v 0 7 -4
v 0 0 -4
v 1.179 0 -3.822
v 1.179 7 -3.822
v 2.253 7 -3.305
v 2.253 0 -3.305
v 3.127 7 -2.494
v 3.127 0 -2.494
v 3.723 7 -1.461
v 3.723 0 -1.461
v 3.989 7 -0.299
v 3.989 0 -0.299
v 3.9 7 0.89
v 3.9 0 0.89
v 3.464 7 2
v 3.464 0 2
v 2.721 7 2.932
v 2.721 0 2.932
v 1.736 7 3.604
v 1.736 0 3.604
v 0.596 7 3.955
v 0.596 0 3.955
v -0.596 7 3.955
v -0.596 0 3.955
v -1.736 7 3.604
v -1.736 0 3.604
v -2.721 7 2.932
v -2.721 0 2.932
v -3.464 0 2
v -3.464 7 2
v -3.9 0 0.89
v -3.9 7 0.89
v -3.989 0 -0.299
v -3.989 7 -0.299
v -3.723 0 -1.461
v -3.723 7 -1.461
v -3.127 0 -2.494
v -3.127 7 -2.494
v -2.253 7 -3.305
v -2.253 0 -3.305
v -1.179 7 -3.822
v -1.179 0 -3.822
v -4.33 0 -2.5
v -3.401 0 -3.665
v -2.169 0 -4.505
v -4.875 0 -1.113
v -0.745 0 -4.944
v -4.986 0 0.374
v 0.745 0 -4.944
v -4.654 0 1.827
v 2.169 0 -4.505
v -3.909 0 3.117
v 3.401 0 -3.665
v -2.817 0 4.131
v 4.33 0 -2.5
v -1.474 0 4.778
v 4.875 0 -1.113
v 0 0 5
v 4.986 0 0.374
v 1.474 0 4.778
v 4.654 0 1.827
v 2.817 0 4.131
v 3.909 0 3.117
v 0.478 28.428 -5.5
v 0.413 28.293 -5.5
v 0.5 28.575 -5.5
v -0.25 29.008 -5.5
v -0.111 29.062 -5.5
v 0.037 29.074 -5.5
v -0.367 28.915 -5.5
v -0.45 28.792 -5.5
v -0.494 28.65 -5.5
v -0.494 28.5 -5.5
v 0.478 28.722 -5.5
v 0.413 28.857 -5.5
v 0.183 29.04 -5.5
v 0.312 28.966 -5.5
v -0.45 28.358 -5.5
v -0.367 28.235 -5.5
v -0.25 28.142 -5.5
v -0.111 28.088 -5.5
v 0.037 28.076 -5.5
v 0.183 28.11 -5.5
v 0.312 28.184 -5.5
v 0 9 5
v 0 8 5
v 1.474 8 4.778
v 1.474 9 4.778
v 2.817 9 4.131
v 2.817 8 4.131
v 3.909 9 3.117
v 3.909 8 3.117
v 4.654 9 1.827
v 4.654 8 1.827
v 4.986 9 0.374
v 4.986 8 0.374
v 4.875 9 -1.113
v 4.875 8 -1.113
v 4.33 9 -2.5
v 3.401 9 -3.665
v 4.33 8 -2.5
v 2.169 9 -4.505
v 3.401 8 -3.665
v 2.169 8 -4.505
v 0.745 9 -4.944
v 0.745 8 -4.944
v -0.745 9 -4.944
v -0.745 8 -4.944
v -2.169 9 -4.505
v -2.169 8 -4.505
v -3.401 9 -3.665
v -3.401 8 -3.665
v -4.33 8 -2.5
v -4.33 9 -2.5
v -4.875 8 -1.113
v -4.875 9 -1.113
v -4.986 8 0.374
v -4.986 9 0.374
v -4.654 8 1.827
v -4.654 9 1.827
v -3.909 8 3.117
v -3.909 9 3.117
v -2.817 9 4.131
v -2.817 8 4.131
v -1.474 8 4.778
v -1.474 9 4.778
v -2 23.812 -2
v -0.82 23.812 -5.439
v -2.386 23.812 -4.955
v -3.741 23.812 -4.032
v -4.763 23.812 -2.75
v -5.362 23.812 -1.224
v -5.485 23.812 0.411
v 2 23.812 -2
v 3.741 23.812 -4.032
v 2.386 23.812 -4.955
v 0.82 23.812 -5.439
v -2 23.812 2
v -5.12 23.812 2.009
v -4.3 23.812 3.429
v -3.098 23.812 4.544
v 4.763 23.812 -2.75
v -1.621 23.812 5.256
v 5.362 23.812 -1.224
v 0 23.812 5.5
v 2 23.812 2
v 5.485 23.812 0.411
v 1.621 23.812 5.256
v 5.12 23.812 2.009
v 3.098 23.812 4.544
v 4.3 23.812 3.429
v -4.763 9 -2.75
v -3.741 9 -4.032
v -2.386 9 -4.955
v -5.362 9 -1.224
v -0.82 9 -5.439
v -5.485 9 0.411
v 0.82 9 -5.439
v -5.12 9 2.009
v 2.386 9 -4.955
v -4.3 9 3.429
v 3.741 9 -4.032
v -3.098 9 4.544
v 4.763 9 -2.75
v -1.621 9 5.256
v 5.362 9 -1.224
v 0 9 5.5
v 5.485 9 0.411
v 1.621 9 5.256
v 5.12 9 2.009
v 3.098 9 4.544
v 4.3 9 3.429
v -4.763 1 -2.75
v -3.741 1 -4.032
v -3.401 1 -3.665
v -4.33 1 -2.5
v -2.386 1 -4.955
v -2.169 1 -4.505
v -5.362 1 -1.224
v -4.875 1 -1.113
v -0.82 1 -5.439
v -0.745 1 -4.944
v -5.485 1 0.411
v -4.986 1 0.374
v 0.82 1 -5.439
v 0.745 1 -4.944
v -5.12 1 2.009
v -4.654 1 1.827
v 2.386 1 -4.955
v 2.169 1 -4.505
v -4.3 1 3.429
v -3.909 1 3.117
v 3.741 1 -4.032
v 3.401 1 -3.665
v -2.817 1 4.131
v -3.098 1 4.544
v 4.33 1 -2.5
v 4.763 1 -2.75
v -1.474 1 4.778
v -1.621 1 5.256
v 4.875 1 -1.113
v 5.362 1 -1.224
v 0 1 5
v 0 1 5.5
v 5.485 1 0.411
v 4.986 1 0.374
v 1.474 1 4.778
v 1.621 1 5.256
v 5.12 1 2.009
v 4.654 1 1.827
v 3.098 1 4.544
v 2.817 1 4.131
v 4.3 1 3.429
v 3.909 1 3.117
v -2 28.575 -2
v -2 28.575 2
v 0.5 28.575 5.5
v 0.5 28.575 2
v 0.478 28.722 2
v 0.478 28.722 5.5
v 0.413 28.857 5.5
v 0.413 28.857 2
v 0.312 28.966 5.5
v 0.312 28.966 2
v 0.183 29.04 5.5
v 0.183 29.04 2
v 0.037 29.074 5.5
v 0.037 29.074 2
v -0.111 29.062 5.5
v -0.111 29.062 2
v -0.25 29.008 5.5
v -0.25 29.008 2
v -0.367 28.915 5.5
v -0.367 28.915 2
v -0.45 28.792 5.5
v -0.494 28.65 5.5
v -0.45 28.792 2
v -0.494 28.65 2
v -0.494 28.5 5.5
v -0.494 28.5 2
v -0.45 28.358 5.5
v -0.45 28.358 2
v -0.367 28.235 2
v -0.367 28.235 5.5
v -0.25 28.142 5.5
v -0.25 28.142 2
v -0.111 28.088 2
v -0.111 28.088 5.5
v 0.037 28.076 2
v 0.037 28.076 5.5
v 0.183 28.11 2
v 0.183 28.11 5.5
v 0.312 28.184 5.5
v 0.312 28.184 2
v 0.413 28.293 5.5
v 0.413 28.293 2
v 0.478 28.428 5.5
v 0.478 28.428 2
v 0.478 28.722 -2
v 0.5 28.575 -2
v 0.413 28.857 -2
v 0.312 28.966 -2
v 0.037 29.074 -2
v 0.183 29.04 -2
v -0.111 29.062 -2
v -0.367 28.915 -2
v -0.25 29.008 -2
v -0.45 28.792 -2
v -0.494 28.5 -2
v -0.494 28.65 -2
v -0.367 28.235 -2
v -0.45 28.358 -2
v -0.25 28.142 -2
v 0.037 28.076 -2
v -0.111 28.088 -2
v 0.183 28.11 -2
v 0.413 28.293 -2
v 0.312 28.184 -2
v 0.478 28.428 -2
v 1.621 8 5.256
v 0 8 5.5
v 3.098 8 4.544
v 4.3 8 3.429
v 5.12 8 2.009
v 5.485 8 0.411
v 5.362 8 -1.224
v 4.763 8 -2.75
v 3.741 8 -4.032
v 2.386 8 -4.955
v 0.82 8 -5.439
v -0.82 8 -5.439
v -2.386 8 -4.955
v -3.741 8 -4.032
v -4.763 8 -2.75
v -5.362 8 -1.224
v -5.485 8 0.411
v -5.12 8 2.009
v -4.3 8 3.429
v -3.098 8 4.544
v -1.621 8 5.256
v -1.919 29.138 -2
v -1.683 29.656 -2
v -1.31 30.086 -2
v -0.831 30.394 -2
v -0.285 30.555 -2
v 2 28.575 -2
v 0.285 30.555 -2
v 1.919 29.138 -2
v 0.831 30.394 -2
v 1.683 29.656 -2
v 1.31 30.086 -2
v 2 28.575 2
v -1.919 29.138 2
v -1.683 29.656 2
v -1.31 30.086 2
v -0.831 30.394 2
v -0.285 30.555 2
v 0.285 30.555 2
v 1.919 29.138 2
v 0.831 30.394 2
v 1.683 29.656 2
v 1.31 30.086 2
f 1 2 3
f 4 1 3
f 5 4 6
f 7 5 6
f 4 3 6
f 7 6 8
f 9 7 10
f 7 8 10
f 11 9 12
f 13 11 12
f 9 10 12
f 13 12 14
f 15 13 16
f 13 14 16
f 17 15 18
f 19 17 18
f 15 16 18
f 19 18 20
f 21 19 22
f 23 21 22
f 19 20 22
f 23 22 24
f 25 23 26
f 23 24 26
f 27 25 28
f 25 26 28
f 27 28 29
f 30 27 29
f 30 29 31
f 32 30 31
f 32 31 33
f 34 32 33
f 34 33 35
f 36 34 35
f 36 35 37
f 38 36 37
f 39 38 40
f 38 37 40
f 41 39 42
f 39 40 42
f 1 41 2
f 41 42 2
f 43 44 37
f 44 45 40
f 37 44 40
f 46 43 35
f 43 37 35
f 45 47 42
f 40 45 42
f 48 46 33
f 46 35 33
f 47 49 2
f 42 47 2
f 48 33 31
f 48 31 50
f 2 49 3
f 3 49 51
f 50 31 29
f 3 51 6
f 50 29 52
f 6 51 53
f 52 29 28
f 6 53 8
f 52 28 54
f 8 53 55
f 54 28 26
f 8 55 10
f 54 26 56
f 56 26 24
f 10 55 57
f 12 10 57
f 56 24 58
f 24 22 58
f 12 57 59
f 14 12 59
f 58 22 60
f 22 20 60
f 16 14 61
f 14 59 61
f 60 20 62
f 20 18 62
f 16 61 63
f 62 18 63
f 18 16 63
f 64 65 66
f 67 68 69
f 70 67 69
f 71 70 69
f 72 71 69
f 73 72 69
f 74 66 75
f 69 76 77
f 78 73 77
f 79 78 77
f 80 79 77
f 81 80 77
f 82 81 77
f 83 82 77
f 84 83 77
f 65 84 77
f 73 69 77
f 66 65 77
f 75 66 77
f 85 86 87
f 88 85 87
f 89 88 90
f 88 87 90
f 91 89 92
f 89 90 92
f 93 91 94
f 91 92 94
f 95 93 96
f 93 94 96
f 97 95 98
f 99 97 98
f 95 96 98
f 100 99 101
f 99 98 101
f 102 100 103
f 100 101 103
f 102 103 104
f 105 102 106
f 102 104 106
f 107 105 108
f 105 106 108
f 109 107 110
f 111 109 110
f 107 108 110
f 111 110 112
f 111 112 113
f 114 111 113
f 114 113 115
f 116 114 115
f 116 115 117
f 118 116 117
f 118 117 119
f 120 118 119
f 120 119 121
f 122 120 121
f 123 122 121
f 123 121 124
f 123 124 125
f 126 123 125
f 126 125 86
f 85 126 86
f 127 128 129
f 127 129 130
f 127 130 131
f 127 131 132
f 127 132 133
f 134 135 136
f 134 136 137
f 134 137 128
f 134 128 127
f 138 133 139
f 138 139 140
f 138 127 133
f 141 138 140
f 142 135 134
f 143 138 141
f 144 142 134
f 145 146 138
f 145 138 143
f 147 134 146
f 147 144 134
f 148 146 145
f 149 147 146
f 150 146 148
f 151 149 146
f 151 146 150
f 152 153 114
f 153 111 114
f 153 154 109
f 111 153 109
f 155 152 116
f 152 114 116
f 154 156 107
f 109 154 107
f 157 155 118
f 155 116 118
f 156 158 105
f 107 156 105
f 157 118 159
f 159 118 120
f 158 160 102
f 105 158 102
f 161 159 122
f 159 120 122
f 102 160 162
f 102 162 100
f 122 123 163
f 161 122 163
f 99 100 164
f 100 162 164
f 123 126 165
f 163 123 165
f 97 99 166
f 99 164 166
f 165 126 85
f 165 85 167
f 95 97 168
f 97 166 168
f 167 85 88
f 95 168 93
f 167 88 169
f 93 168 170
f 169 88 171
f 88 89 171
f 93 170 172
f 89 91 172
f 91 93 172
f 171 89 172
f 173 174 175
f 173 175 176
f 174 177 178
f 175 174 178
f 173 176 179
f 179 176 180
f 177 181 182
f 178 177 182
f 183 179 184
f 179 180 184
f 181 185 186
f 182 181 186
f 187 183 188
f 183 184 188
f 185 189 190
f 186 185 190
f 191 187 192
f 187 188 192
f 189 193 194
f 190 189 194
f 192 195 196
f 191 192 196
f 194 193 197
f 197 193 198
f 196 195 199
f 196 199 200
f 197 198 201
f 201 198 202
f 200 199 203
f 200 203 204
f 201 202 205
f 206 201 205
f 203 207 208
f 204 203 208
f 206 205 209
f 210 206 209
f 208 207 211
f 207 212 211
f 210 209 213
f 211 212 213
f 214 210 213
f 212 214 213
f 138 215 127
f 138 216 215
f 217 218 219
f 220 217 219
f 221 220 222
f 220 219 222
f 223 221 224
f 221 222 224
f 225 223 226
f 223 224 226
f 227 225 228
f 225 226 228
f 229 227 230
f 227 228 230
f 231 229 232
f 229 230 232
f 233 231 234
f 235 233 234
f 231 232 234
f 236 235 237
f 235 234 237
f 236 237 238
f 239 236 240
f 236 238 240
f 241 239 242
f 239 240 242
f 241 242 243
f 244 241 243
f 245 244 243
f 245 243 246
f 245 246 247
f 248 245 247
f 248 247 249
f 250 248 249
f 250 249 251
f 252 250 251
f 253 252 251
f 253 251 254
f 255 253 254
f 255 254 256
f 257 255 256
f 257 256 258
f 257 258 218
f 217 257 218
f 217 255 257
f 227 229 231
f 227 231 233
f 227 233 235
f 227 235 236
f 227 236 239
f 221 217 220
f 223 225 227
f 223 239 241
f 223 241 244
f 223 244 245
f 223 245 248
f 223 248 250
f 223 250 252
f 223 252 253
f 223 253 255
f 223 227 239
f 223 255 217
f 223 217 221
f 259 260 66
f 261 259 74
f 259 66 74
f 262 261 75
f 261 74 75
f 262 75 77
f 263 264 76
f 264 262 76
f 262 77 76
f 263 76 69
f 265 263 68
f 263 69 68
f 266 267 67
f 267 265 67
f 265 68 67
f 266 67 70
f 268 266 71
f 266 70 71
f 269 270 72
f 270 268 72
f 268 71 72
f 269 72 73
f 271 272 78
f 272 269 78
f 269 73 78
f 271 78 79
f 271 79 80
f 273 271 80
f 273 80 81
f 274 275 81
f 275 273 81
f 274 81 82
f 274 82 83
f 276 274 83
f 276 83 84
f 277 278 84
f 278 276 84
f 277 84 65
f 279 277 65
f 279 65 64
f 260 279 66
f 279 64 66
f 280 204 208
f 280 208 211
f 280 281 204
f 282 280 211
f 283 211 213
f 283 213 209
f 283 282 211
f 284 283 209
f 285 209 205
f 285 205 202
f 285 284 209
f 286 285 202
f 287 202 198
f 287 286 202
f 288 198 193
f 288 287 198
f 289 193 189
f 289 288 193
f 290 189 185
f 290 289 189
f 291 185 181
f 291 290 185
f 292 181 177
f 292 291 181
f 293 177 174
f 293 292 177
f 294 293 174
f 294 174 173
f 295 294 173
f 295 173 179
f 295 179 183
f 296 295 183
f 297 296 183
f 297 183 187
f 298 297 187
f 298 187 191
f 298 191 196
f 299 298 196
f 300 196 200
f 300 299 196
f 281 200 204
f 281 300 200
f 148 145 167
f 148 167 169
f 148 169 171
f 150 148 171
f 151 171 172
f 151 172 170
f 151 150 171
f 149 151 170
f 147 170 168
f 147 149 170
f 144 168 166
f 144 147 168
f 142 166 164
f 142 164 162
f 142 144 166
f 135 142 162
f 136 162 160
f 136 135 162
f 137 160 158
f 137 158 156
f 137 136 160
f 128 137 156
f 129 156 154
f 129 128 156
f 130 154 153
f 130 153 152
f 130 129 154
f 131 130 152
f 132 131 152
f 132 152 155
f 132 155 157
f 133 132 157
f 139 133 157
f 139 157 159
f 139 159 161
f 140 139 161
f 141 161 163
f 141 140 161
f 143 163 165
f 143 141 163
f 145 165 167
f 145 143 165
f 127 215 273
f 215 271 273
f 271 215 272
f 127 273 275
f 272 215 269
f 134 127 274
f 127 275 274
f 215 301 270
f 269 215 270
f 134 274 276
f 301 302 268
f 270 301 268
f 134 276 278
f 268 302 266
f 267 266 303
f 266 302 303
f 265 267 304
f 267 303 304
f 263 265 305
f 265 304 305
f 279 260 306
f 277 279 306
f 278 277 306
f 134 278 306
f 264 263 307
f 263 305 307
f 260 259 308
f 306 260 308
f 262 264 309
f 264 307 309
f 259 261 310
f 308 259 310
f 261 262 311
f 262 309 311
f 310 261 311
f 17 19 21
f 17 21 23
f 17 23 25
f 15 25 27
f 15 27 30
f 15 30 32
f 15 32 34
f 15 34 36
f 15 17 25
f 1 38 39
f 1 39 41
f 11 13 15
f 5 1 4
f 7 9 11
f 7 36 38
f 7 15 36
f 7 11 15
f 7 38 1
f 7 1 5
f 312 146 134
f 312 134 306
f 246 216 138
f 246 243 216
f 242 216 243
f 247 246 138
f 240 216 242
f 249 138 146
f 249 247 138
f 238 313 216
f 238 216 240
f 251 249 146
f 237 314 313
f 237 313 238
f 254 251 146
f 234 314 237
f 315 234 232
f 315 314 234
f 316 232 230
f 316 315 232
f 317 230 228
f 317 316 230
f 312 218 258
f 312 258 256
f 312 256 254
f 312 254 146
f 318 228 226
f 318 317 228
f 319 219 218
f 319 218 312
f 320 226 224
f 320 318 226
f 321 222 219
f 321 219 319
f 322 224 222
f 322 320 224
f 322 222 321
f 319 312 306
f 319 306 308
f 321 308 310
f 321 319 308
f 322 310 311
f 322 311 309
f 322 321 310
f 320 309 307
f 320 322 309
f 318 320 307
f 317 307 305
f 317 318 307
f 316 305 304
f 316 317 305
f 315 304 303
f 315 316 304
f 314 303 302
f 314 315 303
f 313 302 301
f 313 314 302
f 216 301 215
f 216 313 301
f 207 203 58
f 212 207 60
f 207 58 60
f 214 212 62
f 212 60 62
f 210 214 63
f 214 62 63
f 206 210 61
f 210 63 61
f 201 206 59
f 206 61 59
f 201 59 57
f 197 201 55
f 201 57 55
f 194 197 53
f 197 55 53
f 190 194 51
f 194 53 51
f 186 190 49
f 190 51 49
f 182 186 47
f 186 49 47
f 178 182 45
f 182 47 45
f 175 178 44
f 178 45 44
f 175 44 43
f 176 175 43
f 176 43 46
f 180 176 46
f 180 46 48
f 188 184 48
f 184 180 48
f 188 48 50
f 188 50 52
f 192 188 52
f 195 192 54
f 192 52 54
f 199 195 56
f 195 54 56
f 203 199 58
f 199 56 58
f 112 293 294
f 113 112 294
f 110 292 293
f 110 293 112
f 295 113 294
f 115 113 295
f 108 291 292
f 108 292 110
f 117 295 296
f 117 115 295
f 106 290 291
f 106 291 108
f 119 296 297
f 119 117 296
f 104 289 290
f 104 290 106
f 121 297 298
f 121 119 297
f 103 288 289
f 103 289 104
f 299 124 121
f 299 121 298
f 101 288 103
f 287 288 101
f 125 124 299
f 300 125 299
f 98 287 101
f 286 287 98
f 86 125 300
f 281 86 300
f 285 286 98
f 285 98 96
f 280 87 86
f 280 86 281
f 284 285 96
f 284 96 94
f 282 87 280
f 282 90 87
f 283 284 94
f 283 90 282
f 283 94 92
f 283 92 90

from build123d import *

# Parameters (mm, degrees)
SKETCH4_R                = 5
BOSS_EXTRUDE1_DEPTH      = 9
SKETCH5_R                = 5.5
BOSS_EXTRUDE2_DEPTH      = 3.5
BOSS_EXTRUDE3_START      = 14.8125
SKETCH6_R                = 5.5
BOSS_EXTRUDE3_DEPTH      = 14.8125
SKETCH7_R                = 4
CUT_EXTRUDE1_DEPTH       = 7
BOSS_EXTRUDE4_DEPTH      = 2
BOSS_EXTRUDE5_DEPTH      = 5.5
BOSS_EXTRUDE5_DEPTH_BACK = 5.5
SKETCH10_R               = 0.5


with BuildPart() as part:
    # Sketch4 → Boss-Extrude1 (new body)
    with BuildSketch(Plane(origin=(0, 0, 0), x_dir=(1, 0, 0), z_dir=(0, 1, 0))):
        with Locations(Location((0, 0, 0), (0, 0, 270))):
            Circle(SKETCH4_R)
    extrude(amount=BOSS_EXTRUDE1_DEPTH)

    # Sketch5 → Boss-Extrude2 (add, symmetric)
    with BuildSketch(Plane(origin=(0, 4.5, 0), x_dir=(1, 0, 0), z_dir=(0, 1, 0))):
        with Locations(Location((0, 0, 0), (0, 0, 270))):
            Circle(SKETCH5_R)
    extrude(amount=BOSS_EXTRUDE2_DEPTH, both=True)

    # Sketch6 → Boss-Extrude3 (add)
    with BuildSketch(Plane(origin=(0, 9, 0), x_dir=(1, 0, 0), z_dir=(0, 1, 0)).offset(BOSS_EXTRUDE3_START)):
        with Locations(Location((0, 0, 0), (0, 0, 270))):
            Circle(SKETCH6_R)
    extrude(amount=-BOSS_EXTRUDE3_DEPTH)

    # Sketch7 → Cut-Extrude1 (cut)
    with BuildSketch(Plane.XZ):
        with Locations(Location((0, 0, 0), (0, 0, 270))):
            Circle(SKETCH7_R)
    extrude(amount=-CUT_EXTRUDE1_DEPTH, mode=Mode.SUBTRACT)

    # Sketch8 → Boss-Extrude4 (add, symmetric)
    with BuildSketch(Plane.XY):
        with BuildLine():
            Line((-2, 23.8125), (2, 23.8125))
            Line((2, 23.8125), (2, 28.575))
            ThreePointArc((2, 28.575), (0, 30.575), (-2, 28.575))
            Line((-2, 28.575), (-2, 23.8125))
        make_face()
    extrude(amount=BOSS_EXTRUDE4_DEPTH, both=True)

    # Sketch10 → Boss-Extrude5 (add, two sides: drawn at the far end of the back side and taken through both)
    with BuildSketch(Plane.XY.offset(-BOSS_EXTRUDE5_DEPTH_BACK)):
        with Locations((0, 28.575)):
            Circle(SKETCH10_R)
    extrude(amount=BOSS_EXTRUDE5_DEPTH + BOSS_EXTRUDE5_DEPTH_BACK)


solid = part.part
